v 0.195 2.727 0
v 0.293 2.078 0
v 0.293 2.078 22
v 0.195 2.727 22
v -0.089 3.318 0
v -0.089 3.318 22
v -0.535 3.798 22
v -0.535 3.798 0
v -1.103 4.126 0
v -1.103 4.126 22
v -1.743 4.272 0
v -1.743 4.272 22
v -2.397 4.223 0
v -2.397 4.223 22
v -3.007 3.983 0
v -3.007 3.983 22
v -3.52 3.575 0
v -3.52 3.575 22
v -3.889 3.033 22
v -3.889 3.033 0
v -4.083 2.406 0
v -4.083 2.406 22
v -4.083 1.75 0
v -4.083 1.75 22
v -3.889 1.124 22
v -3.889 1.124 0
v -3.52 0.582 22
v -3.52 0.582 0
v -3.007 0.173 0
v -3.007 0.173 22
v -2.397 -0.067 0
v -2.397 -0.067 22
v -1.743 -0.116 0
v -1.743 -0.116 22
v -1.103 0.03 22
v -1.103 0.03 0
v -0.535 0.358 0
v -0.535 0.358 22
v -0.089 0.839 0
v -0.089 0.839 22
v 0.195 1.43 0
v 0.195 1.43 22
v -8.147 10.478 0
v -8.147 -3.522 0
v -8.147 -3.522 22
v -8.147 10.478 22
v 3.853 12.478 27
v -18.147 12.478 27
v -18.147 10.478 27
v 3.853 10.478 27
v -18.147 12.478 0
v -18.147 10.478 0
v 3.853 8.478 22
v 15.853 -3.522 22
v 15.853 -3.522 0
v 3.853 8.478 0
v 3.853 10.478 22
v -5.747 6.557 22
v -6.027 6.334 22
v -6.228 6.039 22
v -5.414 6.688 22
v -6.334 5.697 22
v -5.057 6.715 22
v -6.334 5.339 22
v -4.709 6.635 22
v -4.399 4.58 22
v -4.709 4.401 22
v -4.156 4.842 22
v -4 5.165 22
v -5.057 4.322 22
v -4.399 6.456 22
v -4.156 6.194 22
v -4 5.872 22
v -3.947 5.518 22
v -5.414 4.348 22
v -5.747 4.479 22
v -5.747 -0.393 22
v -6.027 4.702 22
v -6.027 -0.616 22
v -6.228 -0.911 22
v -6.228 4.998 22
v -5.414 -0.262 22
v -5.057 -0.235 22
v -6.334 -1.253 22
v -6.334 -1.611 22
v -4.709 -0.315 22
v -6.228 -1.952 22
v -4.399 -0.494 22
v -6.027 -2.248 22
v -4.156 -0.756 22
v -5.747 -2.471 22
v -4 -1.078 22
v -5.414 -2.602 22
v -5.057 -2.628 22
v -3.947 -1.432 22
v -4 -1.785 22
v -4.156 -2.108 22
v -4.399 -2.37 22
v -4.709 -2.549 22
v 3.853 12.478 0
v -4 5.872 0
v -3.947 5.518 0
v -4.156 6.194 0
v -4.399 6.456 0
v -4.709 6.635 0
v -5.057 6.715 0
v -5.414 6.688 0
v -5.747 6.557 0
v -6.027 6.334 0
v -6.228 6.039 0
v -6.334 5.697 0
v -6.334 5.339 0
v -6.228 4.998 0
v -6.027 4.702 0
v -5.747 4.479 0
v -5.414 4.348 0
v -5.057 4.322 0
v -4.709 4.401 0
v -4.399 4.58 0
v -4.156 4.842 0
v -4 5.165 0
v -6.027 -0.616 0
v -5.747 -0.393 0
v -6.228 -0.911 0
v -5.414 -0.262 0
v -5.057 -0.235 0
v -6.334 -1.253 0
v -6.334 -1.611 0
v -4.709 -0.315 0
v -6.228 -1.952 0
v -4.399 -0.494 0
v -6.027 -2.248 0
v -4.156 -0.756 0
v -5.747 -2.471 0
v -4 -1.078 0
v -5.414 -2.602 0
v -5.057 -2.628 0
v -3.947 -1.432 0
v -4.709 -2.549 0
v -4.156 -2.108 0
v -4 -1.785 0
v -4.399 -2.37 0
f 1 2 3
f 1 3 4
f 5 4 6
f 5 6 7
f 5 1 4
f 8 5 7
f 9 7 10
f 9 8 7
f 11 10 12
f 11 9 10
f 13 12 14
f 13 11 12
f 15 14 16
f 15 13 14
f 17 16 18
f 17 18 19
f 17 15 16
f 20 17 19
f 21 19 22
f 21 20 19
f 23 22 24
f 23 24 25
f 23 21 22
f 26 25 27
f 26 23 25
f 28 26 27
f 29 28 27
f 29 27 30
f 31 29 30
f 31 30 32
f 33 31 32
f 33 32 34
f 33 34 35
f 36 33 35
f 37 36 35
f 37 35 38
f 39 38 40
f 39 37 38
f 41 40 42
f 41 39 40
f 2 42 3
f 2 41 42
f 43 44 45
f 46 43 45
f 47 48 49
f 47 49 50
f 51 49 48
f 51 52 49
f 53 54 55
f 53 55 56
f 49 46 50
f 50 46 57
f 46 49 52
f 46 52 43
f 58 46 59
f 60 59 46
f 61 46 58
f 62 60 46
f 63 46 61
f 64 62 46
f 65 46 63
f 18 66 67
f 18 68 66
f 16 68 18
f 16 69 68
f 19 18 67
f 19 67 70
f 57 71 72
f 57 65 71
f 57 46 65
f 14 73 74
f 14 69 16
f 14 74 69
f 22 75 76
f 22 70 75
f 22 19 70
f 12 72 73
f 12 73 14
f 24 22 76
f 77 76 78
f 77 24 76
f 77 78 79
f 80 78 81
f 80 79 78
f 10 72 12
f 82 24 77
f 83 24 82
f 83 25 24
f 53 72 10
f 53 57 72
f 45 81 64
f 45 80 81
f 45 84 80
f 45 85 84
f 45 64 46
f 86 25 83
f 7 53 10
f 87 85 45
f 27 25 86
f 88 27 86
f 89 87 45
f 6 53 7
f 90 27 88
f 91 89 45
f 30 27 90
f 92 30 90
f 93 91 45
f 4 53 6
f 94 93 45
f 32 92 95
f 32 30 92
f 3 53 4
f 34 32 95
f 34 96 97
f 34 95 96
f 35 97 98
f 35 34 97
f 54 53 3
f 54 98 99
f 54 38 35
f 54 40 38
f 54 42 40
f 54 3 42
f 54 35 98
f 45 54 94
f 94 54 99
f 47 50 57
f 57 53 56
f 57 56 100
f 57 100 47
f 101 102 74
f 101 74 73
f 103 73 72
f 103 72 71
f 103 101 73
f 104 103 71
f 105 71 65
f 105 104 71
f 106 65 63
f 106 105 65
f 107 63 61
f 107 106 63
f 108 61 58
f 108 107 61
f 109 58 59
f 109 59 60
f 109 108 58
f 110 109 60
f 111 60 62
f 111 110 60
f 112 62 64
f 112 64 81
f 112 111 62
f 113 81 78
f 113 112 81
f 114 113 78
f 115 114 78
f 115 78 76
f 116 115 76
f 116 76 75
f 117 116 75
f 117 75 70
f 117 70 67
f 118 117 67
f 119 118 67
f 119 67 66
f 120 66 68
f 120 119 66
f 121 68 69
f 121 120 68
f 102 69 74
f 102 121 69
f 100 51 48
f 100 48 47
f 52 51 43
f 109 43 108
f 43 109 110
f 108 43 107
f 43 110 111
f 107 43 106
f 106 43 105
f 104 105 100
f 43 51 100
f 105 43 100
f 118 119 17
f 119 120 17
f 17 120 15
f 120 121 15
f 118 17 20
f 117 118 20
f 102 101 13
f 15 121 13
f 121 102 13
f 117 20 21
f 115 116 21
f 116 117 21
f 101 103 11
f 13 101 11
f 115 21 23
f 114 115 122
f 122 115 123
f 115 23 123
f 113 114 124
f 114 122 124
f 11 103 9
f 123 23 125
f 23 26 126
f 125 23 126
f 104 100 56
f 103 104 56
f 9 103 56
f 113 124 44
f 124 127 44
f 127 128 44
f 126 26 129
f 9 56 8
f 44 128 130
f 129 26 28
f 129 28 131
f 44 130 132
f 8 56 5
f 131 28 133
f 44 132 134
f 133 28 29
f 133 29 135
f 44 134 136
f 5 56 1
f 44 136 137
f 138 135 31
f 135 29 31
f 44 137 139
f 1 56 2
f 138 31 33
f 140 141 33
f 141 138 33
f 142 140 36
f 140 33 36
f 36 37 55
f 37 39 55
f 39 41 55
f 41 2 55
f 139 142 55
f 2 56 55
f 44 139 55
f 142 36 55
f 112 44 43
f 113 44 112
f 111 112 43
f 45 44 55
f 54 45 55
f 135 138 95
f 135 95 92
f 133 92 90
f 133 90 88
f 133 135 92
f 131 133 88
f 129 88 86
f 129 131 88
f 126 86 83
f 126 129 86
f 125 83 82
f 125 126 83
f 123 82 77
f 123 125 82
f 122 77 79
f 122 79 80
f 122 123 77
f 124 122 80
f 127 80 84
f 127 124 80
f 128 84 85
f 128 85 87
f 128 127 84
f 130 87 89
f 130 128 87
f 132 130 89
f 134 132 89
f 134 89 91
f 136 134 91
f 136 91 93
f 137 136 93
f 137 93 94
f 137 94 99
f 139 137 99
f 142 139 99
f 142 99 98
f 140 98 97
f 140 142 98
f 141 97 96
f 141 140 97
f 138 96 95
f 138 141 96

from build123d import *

# Parameters (mm, degrees)
SKETCH_R     = 1.2
SKETCH_R_2   = 2.2
PAD_DEPTH    = 22
SKETCH001_W  = 12
SKETCH001_H  = 22
PAD001_DEPTH = 4
SKETCH002_W  = 2
SKETCH002_H  = 22
PAD002_DEPTH = 10
SKETCH003_W  = 22
SKETCH003_H  = 2
PAD003_DEPTH = 5


with BuildPart() as part:
    # Sketch → Pad (new body)
    with BuildSketch(Plane.XY):
        Polygon((3.852875, 8.478223), (-8.147125, 8.478223), (-8.147125, -3.521777), (15.852875, -3.521777), align=None)
        with Locations((-5.147125, 5.518223)):
            Circle(SKETCH_R, mode=Mode.SUBTRACT)
        with Locations((-5.147125, -1.431777)):
            Circle(SKETCH_R, mode=Mode.SUBTRACT)
        with Locations((-1.907125, 2.078223)):
            Circle(SKETCH_R_2, mode=Mode.SUBTRACT)
    extrude(amount=PAD_DEPTH)

    # Sketch001 (on Face1 of Pad) → Pad001 (join)
    with BuildSketch(Plane(origin=(0, 8.478223, 0), x_dir=(-1, 0, 0), z_dir=(0, 1, 0))):
        with Locations((2.147125, 11)):
            Rectangle(SKETCH001_W, SKETCH001_H)
    extrude(amount=PAD001_DEPTH)

    # Sketch002 (on Face2 of Pad001) → Pad002 (join)
    with BuildSketch(Plane(origin=(-8.147125, 0, 0), x_dir=(0, -1, 0), z_dir=(-1, 0, 0))):
        with Locations((-11.478223, 11)):
            Rectangle(SKETCH002_W, SKETCH002_H)
    extrude(amount=PAD002_DEPTH)

    # Sketch003 (on Face8 of Pad002) → Pad003 (join)
    with BuildSketch(Plane.XY.offset(22)):
        with Locations((-7.147125, 11.478223)):
            Rectangle(SKETCH003_W, SKETCH003_H)
    extrude(amount=PAD003_DEPTH)


solid = part.part
